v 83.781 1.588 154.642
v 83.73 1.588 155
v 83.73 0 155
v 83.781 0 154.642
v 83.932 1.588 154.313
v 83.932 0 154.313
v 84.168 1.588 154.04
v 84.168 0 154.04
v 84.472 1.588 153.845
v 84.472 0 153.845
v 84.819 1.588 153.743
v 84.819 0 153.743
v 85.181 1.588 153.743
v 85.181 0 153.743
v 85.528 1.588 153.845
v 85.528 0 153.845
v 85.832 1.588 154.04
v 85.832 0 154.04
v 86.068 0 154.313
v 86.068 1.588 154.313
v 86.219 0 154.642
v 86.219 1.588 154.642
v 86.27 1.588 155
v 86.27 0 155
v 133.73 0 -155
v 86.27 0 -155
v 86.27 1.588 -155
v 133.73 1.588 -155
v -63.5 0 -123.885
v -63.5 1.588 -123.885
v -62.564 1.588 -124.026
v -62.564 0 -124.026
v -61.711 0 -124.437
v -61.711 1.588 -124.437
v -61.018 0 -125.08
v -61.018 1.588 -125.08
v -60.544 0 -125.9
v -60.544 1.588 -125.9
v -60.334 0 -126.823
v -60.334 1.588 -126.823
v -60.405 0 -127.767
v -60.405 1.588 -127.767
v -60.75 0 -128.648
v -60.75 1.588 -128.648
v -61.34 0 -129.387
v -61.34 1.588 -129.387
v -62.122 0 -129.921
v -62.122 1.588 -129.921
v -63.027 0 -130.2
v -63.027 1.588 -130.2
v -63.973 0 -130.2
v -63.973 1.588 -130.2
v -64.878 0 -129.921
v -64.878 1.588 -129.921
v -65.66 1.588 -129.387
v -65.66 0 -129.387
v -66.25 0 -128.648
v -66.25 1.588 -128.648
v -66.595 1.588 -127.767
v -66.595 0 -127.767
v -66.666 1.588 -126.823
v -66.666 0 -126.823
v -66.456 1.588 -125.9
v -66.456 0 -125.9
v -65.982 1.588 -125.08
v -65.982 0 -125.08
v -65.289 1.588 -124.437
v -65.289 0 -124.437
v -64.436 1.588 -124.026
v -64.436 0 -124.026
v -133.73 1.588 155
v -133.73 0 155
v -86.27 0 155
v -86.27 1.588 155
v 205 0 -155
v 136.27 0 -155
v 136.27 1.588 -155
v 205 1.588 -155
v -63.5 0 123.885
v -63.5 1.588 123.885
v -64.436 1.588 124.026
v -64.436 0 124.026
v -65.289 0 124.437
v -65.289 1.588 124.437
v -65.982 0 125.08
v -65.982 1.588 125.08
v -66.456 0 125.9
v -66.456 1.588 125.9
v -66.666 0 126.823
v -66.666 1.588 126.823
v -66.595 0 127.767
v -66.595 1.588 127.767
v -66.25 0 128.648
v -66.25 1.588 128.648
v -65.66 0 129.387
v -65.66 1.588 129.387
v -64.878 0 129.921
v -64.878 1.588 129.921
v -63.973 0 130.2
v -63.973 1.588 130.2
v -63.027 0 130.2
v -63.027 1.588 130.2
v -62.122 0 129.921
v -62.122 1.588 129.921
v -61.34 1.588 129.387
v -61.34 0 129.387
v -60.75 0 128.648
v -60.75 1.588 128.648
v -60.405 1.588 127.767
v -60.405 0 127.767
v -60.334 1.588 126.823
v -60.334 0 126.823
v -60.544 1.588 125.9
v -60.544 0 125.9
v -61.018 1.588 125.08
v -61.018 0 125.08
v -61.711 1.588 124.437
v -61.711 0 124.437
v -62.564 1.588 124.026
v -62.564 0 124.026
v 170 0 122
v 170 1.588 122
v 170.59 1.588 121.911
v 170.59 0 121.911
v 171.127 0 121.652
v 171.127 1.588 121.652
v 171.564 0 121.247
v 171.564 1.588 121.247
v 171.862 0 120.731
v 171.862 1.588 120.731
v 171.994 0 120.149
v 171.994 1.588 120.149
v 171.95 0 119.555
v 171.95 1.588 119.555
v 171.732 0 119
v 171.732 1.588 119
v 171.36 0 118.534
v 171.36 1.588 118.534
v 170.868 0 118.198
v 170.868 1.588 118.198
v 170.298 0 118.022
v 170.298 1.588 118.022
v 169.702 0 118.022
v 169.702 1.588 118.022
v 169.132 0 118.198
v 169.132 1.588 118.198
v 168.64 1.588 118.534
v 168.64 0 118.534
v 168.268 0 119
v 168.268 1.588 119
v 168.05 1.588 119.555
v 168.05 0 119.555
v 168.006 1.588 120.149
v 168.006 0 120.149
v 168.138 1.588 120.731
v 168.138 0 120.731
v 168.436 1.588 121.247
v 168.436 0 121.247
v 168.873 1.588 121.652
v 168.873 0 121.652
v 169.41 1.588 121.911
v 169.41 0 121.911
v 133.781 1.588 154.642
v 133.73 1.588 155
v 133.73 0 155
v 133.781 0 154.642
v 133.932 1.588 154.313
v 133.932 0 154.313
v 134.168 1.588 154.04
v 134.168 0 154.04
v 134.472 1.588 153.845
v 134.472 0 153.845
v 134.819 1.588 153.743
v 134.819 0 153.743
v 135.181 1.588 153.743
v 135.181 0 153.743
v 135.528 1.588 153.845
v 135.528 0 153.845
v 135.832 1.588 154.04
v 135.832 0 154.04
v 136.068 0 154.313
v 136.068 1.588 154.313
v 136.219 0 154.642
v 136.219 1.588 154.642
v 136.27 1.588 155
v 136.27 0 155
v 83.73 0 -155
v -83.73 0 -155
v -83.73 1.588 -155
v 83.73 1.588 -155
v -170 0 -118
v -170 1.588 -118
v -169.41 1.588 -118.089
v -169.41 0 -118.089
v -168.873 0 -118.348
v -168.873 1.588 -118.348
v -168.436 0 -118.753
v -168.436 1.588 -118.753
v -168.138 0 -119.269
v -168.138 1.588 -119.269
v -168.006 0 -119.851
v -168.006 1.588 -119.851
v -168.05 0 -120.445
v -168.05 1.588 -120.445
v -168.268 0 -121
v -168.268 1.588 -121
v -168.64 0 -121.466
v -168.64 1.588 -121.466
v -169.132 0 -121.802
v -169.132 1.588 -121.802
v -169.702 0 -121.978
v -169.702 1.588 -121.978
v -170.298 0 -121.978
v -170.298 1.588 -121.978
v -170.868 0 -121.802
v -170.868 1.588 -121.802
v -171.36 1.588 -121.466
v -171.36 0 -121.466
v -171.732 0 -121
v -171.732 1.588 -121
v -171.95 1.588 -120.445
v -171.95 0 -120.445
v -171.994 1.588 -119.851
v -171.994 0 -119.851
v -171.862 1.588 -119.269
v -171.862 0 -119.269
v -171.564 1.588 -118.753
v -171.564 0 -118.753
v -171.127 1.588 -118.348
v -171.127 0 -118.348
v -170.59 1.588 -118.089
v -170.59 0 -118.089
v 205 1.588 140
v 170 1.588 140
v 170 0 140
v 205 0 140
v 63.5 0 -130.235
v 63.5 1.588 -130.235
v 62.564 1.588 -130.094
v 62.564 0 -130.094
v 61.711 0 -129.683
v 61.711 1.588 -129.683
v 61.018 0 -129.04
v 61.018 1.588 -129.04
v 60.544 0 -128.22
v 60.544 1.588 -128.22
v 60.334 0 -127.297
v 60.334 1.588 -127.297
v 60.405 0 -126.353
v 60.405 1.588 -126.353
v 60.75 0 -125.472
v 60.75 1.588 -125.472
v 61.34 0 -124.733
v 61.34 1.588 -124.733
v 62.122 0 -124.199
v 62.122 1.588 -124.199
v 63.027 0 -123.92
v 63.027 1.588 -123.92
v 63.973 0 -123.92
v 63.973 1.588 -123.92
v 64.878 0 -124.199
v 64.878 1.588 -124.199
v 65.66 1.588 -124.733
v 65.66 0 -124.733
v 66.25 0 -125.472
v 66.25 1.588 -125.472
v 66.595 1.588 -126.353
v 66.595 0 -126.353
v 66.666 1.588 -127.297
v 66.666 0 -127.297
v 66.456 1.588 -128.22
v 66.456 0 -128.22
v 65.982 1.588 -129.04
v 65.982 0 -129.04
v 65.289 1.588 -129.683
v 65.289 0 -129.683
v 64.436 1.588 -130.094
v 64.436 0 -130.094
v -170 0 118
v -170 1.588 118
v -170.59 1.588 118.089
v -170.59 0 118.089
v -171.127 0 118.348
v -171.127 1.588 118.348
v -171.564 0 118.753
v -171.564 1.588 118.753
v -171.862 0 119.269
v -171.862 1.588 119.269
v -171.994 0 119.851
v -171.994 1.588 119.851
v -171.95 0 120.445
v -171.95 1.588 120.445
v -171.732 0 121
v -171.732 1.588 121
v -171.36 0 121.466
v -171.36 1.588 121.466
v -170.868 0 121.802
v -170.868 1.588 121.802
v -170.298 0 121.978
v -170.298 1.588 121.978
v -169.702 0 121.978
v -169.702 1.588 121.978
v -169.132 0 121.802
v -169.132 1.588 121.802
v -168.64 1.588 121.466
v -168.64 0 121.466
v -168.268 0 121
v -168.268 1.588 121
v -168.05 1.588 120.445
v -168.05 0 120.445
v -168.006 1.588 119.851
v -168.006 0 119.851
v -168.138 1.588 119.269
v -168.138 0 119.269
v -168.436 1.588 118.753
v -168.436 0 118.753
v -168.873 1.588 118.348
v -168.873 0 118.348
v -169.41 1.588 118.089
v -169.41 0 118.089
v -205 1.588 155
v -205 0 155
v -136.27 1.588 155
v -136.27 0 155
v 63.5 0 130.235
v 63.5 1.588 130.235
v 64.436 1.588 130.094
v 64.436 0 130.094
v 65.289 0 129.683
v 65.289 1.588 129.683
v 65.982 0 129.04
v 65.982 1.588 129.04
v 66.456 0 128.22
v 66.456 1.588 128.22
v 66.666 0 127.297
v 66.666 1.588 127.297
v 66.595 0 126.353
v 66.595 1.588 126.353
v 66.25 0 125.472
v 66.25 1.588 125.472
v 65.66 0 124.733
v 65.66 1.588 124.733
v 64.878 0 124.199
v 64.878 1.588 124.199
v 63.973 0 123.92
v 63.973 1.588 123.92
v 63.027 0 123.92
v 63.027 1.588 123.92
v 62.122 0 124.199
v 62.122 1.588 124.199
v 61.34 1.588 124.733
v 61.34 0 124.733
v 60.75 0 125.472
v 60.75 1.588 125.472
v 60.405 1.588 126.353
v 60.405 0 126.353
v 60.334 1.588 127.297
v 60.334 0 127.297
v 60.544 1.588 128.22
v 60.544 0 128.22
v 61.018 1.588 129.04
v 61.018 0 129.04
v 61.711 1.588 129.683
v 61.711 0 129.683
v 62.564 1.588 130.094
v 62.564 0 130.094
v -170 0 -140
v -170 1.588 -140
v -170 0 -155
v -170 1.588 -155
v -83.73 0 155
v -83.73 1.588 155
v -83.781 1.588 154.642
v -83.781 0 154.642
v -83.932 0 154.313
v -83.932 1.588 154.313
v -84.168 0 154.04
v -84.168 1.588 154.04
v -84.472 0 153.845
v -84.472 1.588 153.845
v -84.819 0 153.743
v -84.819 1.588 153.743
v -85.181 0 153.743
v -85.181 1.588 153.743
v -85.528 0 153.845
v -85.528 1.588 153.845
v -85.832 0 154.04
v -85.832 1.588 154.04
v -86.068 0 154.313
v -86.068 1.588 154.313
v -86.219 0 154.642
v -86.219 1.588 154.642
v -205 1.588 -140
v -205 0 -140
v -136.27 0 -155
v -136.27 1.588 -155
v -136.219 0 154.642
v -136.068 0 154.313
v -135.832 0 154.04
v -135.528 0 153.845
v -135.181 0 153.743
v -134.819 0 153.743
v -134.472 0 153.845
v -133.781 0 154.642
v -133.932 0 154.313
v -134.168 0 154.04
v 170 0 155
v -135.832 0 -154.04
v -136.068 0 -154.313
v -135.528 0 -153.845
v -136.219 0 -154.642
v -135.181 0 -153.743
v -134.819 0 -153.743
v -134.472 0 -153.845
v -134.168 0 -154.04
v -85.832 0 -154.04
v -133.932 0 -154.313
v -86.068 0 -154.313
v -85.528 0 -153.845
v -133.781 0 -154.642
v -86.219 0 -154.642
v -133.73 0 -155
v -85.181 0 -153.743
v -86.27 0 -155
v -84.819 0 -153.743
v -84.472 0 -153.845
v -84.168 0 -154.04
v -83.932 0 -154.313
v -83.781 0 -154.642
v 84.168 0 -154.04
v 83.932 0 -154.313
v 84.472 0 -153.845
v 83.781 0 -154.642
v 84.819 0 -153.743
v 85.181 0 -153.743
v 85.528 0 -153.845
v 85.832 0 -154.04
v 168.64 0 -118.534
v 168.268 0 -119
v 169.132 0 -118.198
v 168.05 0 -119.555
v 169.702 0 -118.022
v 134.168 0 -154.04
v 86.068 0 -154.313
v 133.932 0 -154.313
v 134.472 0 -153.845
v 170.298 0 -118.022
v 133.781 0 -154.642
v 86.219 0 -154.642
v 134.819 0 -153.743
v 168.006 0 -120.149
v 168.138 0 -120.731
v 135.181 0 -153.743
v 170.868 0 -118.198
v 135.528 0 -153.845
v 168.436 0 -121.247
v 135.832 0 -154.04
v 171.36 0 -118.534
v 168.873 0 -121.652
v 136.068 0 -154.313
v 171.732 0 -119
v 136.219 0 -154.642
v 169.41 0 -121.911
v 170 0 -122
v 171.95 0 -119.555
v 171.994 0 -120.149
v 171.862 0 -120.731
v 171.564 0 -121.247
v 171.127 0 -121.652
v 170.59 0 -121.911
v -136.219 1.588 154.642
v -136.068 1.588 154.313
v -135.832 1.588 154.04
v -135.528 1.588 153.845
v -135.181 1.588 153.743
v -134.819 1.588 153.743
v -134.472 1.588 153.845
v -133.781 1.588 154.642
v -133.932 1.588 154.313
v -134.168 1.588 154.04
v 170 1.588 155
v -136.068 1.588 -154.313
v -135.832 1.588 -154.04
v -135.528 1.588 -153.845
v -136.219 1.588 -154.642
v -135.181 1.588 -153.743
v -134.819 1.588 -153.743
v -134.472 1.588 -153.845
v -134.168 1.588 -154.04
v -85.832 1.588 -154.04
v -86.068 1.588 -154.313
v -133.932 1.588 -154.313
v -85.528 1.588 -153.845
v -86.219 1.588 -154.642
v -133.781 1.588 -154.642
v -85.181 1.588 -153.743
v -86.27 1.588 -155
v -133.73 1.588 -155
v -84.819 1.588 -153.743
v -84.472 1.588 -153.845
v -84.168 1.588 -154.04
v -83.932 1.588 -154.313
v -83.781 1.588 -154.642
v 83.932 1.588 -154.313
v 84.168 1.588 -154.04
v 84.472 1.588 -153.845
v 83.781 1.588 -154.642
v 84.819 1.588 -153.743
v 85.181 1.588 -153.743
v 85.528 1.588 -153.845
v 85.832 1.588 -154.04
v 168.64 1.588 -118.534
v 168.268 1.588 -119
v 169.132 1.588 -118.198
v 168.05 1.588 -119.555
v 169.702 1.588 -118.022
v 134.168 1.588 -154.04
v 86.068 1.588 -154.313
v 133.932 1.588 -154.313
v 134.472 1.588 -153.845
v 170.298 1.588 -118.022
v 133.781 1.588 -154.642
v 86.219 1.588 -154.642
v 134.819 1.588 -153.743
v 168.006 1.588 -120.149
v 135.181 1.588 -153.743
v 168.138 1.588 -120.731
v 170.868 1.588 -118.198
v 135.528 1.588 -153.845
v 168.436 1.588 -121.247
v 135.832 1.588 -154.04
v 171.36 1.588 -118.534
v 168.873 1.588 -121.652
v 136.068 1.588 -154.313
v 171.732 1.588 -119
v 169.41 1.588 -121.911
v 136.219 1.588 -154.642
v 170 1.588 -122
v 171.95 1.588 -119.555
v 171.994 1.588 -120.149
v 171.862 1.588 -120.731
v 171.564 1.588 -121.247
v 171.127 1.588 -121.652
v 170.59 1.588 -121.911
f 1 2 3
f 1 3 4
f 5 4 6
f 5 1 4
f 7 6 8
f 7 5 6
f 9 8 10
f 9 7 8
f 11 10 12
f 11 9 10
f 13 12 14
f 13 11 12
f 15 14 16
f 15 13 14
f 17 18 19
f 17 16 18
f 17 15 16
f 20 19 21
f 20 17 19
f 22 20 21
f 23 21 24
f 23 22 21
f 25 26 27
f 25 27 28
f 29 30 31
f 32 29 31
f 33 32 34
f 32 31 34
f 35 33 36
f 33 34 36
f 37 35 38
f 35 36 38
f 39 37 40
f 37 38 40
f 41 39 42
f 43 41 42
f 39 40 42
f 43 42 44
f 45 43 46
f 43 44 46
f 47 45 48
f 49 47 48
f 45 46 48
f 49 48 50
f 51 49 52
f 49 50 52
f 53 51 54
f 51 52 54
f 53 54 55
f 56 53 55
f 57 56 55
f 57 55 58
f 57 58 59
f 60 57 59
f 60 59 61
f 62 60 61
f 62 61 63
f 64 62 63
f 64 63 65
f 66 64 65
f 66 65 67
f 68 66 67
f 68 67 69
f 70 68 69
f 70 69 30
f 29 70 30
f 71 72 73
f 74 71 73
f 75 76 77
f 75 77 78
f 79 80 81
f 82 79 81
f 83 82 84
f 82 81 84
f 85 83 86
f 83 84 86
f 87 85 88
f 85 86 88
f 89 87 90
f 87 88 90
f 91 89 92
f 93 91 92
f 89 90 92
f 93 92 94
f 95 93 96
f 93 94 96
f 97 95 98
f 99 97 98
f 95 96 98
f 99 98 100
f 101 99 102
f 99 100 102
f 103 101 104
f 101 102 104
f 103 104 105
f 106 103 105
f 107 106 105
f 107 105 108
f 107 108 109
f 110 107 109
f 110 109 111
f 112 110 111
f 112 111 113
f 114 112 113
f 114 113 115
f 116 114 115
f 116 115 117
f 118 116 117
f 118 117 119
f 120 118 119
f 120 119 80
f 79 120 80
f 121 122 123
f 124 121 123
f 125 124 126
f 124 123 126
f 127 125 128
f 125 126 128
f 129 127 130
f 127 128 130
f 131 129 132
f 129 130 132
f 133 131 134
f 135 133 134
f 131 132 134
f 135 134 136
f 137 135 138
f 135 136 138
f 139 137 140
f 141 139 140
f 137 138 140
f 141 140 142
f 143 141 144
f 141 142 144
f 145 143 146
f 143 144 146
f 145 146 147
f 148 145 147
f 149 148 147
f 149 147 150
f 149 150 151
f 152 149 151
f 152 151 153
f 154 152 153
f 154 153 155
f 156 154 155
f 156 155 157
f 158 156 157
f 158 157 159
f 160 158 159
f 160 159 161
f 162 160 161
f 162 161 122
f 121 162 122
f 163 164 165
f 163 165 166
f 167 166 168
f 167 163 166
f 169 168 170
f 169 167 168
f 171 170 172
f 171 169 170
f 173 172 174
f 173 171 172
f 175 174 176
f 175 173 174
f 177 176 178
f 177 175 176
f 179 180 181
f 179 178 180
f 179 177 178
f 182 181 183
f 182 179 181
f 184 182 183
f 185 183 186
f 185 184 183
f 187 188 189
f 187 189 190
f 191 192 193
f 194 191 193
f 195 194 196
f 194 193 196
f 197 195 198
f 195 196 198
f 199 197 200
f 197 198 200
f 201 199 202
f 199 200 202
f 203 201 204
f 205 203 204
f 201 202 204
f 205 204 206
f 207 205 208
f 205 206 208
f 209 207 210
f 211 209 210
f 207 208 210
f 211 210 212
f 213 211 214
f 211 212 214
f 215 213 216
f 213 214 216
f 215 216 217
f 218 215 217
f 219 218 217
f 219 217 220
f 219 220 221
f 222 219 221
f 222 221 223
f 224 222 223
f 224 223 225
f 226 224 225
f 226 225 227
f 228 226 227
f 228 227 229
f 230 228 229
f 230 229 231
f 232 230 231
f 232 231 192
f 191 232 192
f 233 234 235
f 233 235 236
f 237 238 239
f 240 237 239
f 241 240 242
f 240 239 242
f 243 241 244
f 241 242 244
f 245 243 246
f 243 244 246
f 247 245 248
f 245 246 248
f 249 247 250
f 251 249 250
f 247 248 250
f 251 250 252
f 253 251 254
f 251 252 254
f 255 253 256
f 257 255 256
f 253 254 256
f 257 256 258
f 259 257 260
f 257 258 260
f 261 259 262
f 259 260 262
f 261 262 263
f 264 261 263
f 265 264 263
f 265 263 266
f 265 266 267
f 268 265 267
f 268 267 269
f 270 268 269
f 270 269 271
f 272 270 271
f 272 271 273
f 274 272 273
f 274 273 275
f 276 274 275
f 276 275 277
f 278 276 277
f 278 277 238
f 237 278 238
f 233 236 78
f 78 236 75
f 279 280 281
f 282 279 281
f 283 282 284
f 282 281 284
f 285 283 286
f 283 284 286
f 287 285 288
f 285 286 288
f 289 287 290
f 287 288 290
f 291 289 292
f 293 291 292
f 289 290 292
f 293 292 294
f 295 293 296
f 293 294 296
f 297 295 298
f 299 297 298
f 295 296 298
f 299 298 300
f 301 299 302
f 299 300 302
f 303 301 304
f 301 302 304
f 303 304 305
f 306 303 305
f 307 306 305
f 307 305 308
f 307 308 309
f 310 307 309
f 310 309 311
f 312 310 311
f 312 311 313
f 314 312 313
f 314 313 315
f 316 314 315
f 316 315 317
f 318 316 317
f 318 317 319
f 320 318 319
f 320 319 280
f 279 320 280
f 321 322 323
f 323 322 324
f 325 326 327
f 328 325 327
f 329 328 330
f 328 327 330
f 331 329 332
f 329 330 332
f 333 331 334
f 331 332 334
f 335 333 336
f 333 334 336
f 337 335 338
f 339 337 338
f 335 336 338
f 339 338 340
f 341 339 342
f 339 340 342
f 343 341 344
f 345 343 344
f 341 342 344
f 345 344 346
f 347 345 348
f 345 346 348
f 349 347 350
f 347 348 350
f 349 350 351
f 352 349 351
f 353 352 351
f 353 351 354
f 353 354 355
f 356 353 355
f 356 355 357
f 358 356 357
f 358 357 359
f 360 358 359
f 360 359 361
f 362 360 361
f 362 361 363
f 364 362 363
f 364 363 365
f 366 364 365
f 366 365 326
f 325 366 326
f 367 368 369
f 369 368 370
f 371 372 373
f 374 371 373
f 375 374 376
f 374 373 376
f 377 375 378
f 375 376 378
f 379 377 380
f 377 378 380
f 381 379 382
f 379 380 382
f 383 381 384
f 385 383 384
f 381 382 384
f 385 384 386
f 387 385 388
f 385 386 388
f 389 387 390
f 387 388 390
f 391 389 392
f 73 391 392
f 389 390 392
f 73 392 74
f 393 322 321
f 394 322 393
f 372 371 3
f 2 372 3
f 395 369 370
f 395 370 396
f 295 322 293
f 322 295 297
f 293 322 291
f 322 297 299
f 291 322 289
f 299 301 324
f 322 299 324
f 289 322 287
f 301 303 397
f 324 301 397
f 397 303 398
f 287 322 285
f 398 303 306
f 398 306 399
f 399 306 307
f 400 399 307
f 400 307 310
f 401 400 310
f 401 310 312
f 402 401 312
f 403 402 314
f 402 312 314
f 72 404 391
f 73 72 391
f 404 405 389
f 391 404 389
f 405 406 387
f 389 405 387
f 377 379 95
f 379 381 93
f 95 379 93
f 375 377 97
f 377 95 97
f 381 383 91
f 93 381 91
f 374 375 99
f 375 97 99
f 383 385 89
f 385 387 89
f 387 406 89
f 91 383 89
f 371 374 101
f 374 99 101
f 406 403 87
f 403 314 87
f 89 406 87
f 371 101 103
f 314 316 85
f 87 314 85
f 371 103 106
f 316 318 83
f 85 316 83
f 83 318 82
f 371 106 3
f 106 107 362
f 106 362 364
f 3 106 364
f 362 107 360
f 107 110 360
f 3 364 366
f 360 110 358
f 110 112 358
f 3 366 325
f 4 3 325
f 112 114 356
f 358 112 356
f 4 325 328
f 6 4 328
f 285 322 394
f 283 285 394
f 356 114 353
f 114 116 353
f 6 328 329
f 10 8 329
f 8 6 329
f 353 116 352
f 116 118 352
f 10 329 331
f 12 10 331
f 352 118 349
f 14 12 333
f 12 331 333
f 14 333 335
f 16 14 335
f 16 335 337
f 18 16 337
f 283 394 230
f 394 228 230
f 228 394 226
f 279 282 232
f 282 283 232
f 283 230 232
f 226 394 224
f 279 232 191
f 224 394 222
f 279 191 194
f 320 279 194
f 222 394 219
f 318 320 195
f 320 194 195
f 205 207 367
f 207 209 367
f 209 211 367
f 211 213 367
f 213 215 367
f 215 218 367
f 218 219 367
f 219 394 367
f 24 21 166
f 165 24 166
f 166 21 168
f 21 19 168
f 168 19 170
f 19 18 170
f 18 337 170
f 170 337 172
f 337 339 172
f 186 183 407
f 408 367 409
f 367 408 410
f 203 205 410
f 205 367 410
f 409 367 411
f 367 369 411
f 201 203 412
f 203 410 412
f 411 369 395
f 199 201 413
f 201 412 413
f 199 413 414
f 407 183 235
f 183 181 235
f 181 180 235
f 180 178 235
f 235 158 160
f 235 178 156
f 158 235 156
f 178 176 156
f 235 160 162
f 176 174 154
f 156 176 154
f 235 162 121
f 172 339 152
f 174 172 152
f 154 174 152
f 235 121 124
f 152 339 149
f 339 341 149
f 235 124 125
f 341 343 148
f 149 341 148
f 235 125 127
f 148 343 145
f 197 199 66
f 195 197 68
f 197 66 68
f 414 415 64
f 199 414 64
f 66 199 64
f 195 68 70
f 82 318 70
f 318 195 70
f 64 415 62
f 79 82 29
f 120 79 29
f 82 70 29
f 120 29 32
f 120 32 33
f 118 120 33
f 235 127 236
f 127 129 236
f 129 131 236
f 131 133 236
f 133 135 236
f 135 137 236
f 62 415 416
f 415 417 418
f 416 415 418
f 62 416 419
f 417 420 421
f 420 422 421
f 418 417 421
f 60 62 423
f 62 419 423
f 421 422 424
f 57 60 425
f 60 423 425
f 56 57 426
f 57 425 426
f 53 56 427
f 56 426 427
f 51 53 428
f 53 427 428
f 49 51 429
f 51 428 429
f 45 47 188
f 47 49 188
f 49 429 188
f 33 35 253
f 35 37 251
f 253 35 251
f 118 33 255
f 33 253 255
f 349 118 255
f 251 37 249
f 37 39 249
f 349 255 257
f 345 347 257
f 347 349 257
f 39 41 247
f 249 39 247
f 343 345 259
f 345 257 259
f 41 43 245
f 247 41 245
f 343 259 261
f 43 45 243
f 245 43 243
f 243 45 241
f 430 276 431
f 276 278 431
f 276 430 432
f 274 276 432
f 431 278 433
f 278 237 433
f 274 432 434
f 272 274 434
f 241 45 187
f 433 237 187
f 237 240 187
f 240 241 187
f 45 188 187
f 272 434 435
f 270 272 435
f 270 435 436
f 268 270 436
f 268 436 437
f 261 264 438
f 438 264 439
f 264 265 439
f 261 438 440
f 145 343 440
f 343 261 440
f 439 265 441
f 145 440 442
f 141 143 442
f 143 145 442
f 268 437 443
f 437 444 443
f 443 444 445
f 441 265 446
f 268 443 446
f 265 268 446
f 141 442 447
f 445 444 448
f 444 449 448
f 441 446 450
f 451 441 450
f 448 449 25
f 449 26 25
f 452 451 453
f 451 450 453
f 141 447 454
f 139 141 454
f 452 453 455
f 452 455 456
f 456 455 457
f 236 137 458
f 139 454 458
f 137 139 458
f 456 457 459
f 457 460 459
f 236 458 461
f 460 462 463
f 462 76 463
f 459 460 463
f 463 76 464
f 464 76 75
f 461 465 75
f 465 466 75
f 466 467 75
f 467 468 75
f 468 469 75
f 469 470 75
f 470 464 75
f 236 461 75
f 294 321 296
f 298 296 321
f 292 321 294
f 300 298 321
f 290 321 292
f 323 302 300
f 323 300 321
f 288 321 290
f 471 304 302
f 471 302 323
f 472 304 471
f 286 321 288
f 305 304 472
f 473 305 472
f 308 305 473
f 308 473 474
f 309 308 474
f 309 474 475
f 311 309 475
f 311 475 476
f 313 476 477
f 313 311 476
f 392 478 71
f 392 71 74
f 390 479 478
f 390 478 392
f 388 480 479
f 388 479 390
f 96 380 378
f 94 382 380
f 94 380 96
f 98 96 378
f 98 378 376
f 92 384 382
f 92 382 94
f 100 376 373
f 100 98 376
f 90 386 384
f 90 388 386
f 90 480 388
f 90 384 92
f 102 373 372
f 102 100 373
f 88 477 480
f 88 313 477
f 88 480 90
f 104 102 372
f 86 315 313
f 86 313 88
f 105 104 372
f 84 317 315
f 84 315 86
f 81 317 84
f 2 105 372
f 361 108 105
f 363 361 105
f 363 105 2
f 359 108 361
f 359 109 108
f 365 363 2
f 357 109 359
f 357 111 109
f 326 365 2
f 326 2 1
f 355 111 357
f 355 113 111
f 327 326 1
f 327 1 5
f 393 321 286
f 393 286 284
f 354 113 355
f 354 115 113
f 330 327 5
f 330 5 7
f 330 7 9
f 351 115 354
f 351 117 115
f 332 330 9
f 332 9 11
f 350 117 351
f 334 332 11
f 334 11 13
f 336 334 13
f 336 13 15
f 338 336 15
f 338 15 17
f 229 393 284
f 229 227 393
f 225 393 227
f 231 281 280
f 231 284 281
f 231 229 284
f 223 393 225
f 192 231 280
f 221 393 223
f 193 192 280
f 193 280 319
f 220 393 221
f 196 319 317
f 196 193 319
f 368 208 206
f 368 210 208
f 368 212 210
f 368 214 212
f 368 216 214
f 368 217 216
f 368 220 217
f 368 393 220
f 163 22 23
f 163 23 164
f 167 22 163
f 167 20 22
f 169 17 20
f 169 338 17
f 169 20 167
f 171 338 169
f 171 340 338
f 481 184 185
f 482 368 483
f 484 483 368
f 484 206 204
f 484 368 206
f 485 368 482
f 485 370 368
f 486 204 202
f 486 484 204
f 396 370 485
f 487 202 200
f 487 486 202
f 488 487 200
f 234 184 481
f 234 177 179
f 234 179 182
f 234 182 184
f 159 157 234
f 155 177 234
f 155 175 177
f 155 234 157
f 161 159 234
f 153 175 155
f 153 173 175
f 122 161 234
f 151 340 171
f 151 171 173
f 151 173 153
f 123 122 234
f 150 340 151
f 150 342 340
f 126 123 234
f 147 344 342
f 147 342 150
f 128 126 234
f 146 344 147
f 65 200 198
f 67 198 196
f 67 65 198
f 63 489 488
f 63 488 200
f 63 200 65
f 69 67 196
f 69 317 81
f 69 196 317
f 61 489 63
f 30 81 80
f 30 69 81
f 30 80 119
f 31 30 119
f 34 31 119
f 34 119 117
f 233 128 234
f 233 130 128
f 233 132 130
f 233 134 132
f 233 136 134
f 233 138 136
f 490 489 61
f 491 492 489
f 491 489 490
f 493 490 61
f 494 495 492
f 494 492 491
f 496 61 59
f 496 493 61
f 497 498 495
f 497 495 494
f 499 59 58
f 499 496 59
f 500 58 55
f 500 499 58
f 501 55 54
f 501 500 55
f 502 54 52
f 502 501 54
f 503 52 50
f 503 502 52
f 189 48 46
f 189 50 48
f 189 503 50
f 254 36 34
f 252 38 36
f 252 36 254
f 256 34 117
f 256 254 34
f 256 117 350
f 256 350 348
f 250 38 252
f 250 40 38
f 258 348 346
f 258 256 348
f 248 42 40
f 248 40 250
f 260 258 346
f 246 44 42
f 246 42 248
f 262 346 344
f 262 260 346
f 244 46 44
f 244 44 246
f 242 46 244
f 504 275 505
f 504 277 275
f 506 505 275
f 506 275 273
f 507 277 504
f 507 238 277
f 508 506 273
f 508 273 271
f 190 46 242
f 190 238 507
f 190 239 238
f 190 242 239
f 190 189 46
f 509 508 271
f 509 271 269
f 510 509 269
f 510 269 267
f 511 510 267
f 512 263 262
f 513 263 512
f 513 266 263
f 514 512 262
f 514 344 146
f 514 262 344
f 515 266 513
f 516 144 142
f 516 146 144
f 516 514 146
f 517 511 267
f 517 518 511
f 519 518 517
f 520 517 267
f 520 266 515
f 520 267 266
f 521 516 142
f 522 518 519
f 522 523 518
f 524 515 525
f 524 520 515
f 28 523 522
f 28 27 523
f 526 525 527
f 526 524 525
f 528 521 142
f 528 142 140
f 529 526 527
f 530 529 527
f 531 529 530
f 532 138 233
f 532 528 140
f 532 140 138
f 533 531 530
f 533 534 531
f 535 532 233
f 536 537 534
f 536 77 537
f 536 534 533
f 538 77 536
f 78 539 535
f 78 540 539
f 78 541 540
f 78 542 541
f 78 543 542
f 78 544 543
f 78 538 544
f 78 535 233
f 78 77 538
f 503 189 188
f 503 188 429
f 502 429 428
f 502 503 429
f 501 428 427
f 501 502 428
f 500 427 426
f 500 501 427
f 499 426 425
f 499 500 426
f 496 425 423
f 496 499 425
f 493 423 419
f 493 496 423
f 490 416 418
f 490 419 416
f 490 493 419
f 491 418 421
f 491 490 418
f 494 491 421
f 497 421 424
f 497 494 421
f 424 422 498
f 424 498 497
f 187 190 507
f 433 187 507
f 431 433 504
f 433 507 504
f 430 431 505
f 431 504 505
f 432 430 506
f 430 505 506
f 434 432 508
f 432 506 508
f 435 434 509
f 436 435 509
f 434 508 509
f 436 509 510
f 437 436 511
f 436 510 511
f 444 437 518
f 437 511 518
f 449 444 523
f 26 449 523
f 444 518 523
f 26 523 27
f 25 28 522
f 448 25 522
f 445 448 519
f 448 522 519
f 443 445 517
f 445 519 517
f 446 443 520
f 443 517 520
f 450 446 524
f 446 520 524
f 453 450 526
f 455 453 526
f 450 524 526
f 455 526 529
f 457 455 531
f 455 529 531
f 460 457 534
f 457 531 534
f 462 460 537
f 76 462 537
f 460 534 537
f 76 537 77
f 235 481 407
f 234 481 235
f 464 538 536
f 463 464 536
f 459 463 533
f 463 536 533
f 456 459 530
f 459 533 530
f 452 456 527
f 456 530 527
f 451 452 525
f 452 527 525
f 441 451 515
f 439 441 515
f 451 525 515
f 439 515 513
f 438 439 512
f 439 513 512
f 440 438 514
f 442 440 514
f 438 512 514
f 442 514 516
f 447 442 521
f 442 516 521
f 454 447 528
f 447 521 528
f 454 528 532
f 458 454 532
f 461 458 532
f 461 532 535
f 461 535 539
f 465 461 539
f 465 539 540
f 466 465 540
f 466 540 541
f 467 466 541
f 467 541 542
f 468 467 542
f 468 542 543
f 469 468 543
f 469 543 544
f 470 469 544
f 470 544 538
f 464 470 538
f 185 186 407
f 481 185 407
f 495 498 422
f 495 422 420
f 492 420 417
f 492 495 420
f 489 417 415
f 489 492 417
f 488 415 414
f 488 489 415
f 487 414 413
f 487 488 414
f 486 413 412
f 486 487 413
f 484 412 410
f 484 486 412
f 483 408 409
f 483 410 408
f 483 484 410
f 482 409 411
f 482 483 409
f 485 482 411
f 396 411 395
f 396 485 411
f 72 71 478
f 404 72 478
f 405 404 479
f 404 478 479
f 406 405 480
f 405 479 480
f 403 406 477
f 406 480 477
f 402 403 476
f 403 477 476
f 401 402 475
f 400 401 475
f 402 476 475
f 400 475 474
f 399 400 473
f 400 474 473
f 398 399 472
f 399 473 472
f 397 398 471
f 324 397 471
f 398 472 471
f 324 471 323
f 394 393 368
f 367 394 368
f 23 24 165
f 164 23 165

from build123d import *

# Parameters (mm, degrees)
SKETCH1_W           = 410
SKETCH1_H           = 310
BOSS_EXTRUDE1_DEPTH = 1.5875
SKETCH2_R           = 3.175
SKETCH2_R_2         = 2
CUT_EXTRUDE1_DEPTH  = 258.006848462
SKETCH3_W           = 35
SKETCH3_H           = 15
CUT_EXTRUDE2_DEPTH  = 258.006848462


with BuildPart() as part:
    # Sketch1 → Boss-Extrude1 (new body)
    with BuildSketch(Plane(origin=(0, 0, 0), x_dir=(1, 0, 0), z_dir=(0, 1, 0))):
        Rectangle(SKETCH1_W, SKETCH1_H)
    extrude(amount=BOSS_EXTRUDE1_DEPTH)

    # Sketch2 → Cut-Extrude1 (cut, through all)
    with BuildSketch(Plane(origin=(0, 1.5875, 0), x_dir=(1, 0, 0), z_dir=(0, 1, 0))):
        with Locations((-63.5, 127.06)):
            Circle(SKETCH2_R)
        with Locations((-170, 120)):
            Circle(SKETCH2_R_2)
        with Locations((63.5, 127.06)):
            Circle(SKETCH2_R)
        with Locations((170, 120)):
            Circle(SKETCH2_R_2)
        with Locations((170, -120)):
            Circle(SKETCH2_R_2)
        with Locations((63.5, -127.06)):
            Circle(SKETCH2_R)
        with Locations((-63.5, -127.06)):
            Circle(SKETCH2_R)
        with Locations((-170, -120)):
            Circle(SKETCH2_R_2)
        with BuildLine():
            Line((-136.27, 155), (-133.73, 155))
            ThreePointArc((-133.73, 155), (-135, 153.73), (-136.27, 155))
        make_face()
        with BuildLine():
            Line((-86.27, 155), (-83.73, 155))
            ThreePointArc((-83.73, 155), (-85, 153.73), (-86.27, 155))
        make_face()
        with BuildLine():
            Line((86.27, 155), (83.73, 155))
            ThreePointArc((83.73, 155), (85, 153.73), (86.27, 155))
        make_face()
        with BuildLine():
            Line((136.27, 155), (133.73, 155))
            ThreePointArc((133.73, 155), (135, 153.73), (136.27, 155))
        make_face()
        with BuildLine():
            Line((136.27, -155), (133.73, -155))
            ThreePointArc((133.73, -155), (135, -153.73), (136.27, -155))
        make_face()
        with BuildLine():
            Line((86.27, -155), (83.73, -155))
            ThreePointArc((83.73, -155), (85, -153.73), (86.27, -155))
        make_face()
        with BuildLine():
            Line((-86.27, -155), (-83.73, -155))
            ThreePointArc((-83.73, -155), (-85, -153.73), (-86.27, -155))
        make_face()
        with BuildLine():
            Line((-136.27, -155), (-133.73, -155))
            ThreePointArc((-133.73, -155), (-135, -153.73), (-136.27, -155))
        make_face()
    extrude(amount=-CUT_EXTRUDE1_DEPTH, mode=Mode.SUBTRACT)

    # Sketch3 → Cut-Extrude2 (cut, through all)
    with BuildSketch(Plane(origin=(0, 1.5875, 0), x_dir=(1, 0, 0), z_dir=(0, 1, 0))):
        with Locations((-187.5, 147.5)):
            Rectangle(SKETCH3_W, SKETCH3_H)
        with Locations((187.5, -147.5)):
            Rectangle(SKETCH3_W, SKETCH3_H)
    extrude(amount=-CUT_EXTRUDE2_DEPTH, mode=Mode.SUBTRACT)


solid = part.part
